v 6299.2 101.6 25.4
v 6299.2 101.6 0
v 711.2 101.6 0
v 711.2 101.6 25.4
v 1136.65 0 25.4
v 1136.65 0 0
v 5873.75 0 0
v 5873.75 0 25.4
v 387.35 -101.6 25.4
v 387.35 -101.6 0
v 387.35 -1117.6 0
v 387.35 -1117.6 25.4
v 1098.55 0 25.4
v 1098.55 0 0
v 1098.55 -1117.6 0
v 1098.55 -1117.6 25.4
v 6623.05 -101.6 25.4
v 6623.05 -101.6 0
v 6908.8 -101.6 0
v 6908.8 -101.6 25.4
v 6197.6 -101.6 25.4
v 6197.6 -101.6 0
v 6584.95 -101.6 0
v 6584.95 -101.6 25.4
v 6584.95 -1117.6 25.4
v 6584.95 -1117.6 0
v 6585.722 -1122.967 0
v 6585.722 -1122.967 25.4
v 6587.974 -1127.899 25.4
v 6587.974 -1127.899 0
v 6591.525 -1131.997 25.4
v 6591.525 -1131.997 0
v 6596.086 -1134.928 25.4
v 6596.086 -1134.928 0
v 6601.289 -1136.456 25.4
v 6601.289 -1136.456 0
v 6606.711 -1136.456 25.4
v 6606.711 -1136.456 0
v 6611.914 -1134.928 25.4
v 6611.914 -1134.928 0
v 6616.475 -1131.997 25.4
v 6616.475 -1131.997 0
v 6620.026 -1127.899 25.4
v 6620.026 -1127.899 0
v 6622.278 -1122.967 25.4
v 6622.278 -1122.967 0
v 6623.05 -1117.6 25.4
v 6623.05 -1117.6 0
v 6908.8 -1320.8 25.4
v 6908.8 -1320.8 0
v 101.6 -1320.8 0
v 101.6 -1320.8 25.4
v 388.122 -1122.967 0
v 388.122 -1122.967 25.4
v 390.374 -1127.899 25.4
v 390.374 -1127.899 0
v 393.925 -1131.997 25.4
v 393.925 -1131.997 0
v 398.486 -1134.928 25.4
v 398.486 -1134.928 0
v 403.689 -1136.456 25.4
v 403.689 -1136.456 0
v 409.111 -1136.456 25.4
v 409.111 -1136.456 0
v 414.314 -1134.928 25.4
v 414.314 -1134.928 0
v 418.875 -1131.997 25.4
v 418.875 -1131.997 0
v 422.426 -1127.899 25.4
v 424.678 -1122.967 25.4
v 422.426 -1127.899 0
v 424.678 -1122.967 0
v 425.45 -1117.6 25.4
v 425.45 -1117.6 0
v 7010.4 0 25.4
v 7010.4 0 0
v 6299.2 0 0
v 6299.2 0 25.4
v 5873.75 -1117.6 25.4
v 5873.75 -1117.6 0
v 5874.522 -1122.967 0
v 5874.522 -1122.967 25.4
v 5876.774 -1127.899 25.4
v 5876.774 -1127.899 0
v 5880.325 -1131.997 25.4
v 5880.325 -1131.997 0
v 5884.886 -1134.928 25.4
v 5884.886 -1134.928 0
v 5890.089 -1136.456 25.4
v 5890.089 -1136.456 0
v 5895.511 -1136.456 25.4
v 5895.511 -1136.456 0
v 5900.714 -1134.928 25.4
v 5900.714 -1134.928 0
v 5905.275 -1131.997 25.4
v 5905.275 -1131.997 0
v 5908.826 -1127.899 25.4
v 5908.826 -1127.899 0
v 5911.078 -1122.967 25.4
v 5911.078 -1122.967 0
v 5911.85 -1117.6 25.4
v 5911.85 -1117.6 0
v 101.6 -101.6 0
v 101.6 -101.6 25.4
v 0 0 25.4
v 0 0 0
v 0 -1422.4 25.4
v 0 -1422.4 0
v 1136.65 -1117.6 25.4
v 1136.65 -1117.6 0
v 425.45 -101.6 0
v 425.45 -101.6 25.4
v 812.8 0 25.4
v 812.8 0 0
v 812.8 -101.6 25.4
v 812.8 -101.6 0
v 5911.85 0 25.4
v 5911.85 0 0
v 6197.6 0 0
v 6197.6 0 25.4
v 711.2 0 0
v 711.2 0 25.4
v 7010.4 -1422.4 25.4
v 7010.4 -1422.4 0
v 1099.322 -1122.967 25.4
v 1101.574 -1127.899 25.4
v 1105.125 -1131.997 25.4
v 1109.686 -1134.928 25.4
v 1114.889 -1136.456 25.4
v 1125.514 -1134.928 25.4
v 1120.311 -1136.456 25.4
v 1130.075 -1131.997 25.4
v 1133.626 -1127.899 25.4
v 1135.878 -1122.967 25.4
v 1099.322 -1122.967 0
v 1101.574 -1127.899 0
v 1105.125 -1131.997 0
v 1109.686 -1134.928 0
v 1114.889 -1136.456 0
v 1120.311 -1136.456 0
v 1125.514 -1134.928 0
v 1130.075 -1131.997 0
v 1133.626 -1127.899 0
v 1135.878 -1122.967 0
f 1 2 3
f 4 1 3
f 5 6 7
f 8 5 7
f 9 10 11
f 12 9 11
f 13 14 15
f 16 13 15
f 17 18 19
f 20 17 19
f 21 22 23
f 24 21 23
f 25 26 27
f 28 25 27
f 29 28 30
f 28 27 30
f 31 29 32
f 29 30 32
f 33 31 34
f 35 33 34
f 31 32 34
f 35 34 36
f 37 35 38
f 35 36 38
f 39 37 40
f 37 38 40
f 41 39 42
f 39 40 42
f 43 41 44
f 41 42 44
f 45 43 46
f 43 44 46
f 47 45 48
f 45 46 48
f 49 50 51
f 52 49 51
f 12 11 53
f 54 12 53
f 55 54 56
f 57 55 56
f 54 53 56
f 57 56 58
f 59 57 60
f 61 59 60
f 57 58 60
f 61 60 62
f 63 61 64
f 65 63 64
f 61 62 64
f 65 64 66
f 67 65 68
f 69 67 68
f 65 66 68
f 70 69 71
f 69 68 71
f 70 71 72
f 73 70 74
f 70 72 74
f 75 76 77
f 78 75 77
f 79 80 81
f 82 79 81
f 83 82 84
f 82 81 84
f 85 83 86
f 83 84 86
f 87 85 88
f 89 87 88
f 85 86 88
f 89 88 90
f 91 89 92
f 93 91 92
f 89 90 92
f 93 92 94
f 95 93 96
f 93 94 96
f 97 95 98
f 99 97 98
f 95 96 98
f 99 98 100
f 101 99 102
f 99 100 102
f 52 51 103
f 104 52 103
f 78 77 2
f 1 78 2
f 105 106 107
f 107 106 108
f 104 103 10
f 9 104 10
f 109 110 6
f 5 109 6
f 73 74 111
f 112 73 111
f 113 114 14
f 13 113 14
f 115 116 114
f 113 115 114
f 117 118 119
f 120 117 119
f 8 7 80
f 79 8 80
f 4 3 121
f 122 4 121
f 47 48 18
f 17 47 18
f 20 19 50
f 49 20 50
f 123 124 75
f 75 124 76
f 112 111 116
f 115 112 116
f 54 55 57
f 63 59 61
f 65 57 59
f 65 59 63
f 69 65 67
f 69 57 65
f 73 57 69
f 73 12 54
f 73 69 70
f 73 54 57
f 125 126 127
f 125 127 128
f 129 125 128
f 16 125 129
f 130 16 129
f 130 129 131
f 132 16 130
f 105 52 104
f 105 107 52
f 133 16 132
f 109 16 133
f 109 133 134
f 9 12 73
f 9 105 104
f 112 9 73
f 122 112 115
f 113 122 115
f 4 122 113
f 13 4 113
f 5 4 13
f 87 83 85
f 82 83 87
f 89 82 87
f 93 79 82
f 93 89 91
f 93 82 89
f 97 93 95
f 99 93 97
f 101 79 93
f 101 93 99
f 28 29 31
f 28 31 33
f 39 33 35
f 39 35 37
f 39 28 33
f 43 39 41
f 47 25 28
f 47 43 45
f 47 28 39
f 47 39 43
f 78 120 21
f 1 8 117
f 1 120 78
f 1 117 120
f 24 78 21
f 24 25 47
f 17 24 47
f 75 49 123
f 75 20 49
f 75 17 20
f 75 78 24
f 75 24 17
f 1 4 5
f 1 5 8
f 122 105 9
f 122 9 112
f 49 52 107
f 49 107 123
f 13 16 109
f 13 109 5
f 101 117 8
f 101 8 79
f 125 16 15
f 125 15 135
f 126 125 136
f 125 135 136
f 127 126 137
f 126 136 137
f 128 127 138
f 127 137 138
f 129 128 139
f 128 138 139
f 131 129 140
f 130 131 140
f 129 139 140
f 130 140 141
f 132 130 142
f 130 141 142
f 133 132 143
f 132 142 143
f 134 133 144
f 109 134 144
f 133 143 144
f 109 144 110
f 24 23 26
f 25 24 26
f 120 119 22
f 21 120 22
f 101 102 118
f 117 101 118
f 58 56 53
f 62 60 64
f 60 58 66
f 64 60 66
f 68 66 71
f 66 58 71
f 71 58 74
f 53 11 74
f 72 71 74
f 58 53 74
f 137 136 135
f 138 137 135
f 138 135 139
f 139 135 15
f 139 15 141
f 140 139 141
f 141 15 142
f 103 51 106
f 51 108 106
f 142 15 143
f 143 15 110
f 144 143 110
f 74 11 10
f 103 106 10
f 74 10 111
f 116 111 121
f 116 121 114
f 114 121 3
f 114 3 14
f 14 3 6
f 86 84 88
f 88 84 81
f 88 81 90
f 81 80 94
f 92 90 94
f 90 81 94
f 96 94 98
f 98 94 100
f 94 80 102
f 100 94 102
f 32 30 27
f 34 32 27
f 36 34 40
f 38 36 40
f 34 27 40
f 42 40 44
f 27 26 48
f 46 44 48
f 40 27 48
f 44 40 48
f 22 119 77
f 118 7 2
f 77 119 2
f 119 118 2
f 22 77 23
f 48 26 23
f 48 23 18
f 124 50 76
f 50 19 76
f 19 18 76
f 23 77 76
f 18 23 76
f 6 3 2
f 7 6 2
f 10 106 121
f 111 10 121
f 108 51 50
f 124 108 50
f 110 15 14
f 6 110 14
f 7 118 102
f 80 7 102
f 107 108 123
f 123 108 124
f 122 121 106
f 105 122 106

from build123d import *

# Parameters (mm, degrees)
F1_DEPTH = 25.4


with BuildPart() as f1:
    # F0 (on Top) → F1 (new body)
    with BuildSketch(Plane.XY):
        Polygon((0, 0), (0, -1422.4), (7010.4, -1422.4), (7010.4, 0), (6299.2, 0), (6299.2, 101.6), (711.2, 101.6), (711.2, 0), align=None)
        Polygon((6908.8, -1320.8), (101.6, -1320.8), (101.6, -101.6), (387.35, -101.6), (425.45, -101.6), (812.8, -101.6), (812.8, 0), (1098.55, 0), (1136.65, 0), (5873.75, 0), (5911.85, 0), (6197.6, 0), (6197.6, -101.6), (6584.95, -101.6), (6623.05, -101.6), (6908.8, -101.6), align=None, mode=Mode.SUBTRACT)
        with BuildLine():
            Line((425.45, -101.6), (387.35, -101.6))
            Line((387.35, -101.6), (387.35, -1117.6))
            ThreePointArc((387.35, -1117.6), (406.4, -1098.55), (425.45, -1117.6))
            Line((425.45, -1117.6), (425.45, -101.6))
        make_face()
        with BuildLine():
            ThreePointArc((425.45, -1117.6), (406.4, -1098.55), (387.35, -1117.6))
            Line((387.35, -1117.6), (425.45, -1117.6))
        make_face()
        with BuildLine():
            Line((425.45, -1117.6), (387.35, -1117.6))
            ThreePointArc((387.35, -1117.6), (406.4, -1136.65), (425.45, -1117.6))
        make_face()
        with BuildLine():
            Line((1136.65, 0), (1098.55, 0))
            Line((1098.55, 0), (1098.55, -1117.6))
            ThreePointArc((1098.55, -1117.6), (1117.6, -1098.55), (1136.65, -1117.6))
            Line((1136.65, -1117.6), (1136.65, 0))
        make_face()
        with BuildLine():
            ThreePointArc((1136.65, -1117.6), (1117.6, -1098.55), (1098.55, -1117.6))
            Line((1098.55, -1117.6), (1136.65, -1117.6))
        make_face()
        with BuildLine():
            Line((1136.65, -1117.6), (1098.55, -1117.6))
            ThreePointArc((1098.55, -1117.6), (1117.6, -1136.65), (1136.65, -1117.6))
        make_face()
        with BuildLine():
            Line((5911.85, -1117.6), (5911.85, 0))
            Line((5911.85, 0), (5873.75, 0))
            Line((5873.75, 0), (5873.75, -1117.6))
            ThreePointArc((5873.75, -1117.6), (5892.8, -1098.55), (5911.85, -1117.6))
        make_face()
        with BuildLine():
            Line((5873.75, -1117.6), (5911.85, -1117.6))
            ThreePointArc((5911.85, -1117.6), (5892.8, -1098.55), (5873.75, -1117.6))
        make_face()
        with BuildLine():
            ThreePointArc((5873.75, -1117.6), (5892.8, -1136.65), (5911.85, -1117.6))
            Line((5911.85, -1117.6), (5873.75, -1117.6))
        make_face()
        with BuildLine():
            Line((6623.05, -1117.6), (6623.05, -101.6))
            Line((6623.05, -101.6), (6584.95, -101.6))
            Line((6584.95, -101.6), (6584.95, -1117.6))
            ThreePointArc((6584.95, -1117.6), (6604, -1098.55), (6623.05, -1117.6))
        make_face()
        with BuildLine():
            Line((6584.95, -1117.6), (6623.05, -1117.6))
            ThreePointArc((6623.05, -1117.6), (6604, -1098.55), (6584.95, -1117.6))
        make_face()
        with BuildLine():
            ThreePointArc((6584.95, -1117.6), (6604, -1136.65), (6623.05, -1117.6))
            Line((6623.05, -1117.6), (6584.95, -1117.6))
        make_face()
    extrude(amount=F1_DEPTH)


solid = f1.part
